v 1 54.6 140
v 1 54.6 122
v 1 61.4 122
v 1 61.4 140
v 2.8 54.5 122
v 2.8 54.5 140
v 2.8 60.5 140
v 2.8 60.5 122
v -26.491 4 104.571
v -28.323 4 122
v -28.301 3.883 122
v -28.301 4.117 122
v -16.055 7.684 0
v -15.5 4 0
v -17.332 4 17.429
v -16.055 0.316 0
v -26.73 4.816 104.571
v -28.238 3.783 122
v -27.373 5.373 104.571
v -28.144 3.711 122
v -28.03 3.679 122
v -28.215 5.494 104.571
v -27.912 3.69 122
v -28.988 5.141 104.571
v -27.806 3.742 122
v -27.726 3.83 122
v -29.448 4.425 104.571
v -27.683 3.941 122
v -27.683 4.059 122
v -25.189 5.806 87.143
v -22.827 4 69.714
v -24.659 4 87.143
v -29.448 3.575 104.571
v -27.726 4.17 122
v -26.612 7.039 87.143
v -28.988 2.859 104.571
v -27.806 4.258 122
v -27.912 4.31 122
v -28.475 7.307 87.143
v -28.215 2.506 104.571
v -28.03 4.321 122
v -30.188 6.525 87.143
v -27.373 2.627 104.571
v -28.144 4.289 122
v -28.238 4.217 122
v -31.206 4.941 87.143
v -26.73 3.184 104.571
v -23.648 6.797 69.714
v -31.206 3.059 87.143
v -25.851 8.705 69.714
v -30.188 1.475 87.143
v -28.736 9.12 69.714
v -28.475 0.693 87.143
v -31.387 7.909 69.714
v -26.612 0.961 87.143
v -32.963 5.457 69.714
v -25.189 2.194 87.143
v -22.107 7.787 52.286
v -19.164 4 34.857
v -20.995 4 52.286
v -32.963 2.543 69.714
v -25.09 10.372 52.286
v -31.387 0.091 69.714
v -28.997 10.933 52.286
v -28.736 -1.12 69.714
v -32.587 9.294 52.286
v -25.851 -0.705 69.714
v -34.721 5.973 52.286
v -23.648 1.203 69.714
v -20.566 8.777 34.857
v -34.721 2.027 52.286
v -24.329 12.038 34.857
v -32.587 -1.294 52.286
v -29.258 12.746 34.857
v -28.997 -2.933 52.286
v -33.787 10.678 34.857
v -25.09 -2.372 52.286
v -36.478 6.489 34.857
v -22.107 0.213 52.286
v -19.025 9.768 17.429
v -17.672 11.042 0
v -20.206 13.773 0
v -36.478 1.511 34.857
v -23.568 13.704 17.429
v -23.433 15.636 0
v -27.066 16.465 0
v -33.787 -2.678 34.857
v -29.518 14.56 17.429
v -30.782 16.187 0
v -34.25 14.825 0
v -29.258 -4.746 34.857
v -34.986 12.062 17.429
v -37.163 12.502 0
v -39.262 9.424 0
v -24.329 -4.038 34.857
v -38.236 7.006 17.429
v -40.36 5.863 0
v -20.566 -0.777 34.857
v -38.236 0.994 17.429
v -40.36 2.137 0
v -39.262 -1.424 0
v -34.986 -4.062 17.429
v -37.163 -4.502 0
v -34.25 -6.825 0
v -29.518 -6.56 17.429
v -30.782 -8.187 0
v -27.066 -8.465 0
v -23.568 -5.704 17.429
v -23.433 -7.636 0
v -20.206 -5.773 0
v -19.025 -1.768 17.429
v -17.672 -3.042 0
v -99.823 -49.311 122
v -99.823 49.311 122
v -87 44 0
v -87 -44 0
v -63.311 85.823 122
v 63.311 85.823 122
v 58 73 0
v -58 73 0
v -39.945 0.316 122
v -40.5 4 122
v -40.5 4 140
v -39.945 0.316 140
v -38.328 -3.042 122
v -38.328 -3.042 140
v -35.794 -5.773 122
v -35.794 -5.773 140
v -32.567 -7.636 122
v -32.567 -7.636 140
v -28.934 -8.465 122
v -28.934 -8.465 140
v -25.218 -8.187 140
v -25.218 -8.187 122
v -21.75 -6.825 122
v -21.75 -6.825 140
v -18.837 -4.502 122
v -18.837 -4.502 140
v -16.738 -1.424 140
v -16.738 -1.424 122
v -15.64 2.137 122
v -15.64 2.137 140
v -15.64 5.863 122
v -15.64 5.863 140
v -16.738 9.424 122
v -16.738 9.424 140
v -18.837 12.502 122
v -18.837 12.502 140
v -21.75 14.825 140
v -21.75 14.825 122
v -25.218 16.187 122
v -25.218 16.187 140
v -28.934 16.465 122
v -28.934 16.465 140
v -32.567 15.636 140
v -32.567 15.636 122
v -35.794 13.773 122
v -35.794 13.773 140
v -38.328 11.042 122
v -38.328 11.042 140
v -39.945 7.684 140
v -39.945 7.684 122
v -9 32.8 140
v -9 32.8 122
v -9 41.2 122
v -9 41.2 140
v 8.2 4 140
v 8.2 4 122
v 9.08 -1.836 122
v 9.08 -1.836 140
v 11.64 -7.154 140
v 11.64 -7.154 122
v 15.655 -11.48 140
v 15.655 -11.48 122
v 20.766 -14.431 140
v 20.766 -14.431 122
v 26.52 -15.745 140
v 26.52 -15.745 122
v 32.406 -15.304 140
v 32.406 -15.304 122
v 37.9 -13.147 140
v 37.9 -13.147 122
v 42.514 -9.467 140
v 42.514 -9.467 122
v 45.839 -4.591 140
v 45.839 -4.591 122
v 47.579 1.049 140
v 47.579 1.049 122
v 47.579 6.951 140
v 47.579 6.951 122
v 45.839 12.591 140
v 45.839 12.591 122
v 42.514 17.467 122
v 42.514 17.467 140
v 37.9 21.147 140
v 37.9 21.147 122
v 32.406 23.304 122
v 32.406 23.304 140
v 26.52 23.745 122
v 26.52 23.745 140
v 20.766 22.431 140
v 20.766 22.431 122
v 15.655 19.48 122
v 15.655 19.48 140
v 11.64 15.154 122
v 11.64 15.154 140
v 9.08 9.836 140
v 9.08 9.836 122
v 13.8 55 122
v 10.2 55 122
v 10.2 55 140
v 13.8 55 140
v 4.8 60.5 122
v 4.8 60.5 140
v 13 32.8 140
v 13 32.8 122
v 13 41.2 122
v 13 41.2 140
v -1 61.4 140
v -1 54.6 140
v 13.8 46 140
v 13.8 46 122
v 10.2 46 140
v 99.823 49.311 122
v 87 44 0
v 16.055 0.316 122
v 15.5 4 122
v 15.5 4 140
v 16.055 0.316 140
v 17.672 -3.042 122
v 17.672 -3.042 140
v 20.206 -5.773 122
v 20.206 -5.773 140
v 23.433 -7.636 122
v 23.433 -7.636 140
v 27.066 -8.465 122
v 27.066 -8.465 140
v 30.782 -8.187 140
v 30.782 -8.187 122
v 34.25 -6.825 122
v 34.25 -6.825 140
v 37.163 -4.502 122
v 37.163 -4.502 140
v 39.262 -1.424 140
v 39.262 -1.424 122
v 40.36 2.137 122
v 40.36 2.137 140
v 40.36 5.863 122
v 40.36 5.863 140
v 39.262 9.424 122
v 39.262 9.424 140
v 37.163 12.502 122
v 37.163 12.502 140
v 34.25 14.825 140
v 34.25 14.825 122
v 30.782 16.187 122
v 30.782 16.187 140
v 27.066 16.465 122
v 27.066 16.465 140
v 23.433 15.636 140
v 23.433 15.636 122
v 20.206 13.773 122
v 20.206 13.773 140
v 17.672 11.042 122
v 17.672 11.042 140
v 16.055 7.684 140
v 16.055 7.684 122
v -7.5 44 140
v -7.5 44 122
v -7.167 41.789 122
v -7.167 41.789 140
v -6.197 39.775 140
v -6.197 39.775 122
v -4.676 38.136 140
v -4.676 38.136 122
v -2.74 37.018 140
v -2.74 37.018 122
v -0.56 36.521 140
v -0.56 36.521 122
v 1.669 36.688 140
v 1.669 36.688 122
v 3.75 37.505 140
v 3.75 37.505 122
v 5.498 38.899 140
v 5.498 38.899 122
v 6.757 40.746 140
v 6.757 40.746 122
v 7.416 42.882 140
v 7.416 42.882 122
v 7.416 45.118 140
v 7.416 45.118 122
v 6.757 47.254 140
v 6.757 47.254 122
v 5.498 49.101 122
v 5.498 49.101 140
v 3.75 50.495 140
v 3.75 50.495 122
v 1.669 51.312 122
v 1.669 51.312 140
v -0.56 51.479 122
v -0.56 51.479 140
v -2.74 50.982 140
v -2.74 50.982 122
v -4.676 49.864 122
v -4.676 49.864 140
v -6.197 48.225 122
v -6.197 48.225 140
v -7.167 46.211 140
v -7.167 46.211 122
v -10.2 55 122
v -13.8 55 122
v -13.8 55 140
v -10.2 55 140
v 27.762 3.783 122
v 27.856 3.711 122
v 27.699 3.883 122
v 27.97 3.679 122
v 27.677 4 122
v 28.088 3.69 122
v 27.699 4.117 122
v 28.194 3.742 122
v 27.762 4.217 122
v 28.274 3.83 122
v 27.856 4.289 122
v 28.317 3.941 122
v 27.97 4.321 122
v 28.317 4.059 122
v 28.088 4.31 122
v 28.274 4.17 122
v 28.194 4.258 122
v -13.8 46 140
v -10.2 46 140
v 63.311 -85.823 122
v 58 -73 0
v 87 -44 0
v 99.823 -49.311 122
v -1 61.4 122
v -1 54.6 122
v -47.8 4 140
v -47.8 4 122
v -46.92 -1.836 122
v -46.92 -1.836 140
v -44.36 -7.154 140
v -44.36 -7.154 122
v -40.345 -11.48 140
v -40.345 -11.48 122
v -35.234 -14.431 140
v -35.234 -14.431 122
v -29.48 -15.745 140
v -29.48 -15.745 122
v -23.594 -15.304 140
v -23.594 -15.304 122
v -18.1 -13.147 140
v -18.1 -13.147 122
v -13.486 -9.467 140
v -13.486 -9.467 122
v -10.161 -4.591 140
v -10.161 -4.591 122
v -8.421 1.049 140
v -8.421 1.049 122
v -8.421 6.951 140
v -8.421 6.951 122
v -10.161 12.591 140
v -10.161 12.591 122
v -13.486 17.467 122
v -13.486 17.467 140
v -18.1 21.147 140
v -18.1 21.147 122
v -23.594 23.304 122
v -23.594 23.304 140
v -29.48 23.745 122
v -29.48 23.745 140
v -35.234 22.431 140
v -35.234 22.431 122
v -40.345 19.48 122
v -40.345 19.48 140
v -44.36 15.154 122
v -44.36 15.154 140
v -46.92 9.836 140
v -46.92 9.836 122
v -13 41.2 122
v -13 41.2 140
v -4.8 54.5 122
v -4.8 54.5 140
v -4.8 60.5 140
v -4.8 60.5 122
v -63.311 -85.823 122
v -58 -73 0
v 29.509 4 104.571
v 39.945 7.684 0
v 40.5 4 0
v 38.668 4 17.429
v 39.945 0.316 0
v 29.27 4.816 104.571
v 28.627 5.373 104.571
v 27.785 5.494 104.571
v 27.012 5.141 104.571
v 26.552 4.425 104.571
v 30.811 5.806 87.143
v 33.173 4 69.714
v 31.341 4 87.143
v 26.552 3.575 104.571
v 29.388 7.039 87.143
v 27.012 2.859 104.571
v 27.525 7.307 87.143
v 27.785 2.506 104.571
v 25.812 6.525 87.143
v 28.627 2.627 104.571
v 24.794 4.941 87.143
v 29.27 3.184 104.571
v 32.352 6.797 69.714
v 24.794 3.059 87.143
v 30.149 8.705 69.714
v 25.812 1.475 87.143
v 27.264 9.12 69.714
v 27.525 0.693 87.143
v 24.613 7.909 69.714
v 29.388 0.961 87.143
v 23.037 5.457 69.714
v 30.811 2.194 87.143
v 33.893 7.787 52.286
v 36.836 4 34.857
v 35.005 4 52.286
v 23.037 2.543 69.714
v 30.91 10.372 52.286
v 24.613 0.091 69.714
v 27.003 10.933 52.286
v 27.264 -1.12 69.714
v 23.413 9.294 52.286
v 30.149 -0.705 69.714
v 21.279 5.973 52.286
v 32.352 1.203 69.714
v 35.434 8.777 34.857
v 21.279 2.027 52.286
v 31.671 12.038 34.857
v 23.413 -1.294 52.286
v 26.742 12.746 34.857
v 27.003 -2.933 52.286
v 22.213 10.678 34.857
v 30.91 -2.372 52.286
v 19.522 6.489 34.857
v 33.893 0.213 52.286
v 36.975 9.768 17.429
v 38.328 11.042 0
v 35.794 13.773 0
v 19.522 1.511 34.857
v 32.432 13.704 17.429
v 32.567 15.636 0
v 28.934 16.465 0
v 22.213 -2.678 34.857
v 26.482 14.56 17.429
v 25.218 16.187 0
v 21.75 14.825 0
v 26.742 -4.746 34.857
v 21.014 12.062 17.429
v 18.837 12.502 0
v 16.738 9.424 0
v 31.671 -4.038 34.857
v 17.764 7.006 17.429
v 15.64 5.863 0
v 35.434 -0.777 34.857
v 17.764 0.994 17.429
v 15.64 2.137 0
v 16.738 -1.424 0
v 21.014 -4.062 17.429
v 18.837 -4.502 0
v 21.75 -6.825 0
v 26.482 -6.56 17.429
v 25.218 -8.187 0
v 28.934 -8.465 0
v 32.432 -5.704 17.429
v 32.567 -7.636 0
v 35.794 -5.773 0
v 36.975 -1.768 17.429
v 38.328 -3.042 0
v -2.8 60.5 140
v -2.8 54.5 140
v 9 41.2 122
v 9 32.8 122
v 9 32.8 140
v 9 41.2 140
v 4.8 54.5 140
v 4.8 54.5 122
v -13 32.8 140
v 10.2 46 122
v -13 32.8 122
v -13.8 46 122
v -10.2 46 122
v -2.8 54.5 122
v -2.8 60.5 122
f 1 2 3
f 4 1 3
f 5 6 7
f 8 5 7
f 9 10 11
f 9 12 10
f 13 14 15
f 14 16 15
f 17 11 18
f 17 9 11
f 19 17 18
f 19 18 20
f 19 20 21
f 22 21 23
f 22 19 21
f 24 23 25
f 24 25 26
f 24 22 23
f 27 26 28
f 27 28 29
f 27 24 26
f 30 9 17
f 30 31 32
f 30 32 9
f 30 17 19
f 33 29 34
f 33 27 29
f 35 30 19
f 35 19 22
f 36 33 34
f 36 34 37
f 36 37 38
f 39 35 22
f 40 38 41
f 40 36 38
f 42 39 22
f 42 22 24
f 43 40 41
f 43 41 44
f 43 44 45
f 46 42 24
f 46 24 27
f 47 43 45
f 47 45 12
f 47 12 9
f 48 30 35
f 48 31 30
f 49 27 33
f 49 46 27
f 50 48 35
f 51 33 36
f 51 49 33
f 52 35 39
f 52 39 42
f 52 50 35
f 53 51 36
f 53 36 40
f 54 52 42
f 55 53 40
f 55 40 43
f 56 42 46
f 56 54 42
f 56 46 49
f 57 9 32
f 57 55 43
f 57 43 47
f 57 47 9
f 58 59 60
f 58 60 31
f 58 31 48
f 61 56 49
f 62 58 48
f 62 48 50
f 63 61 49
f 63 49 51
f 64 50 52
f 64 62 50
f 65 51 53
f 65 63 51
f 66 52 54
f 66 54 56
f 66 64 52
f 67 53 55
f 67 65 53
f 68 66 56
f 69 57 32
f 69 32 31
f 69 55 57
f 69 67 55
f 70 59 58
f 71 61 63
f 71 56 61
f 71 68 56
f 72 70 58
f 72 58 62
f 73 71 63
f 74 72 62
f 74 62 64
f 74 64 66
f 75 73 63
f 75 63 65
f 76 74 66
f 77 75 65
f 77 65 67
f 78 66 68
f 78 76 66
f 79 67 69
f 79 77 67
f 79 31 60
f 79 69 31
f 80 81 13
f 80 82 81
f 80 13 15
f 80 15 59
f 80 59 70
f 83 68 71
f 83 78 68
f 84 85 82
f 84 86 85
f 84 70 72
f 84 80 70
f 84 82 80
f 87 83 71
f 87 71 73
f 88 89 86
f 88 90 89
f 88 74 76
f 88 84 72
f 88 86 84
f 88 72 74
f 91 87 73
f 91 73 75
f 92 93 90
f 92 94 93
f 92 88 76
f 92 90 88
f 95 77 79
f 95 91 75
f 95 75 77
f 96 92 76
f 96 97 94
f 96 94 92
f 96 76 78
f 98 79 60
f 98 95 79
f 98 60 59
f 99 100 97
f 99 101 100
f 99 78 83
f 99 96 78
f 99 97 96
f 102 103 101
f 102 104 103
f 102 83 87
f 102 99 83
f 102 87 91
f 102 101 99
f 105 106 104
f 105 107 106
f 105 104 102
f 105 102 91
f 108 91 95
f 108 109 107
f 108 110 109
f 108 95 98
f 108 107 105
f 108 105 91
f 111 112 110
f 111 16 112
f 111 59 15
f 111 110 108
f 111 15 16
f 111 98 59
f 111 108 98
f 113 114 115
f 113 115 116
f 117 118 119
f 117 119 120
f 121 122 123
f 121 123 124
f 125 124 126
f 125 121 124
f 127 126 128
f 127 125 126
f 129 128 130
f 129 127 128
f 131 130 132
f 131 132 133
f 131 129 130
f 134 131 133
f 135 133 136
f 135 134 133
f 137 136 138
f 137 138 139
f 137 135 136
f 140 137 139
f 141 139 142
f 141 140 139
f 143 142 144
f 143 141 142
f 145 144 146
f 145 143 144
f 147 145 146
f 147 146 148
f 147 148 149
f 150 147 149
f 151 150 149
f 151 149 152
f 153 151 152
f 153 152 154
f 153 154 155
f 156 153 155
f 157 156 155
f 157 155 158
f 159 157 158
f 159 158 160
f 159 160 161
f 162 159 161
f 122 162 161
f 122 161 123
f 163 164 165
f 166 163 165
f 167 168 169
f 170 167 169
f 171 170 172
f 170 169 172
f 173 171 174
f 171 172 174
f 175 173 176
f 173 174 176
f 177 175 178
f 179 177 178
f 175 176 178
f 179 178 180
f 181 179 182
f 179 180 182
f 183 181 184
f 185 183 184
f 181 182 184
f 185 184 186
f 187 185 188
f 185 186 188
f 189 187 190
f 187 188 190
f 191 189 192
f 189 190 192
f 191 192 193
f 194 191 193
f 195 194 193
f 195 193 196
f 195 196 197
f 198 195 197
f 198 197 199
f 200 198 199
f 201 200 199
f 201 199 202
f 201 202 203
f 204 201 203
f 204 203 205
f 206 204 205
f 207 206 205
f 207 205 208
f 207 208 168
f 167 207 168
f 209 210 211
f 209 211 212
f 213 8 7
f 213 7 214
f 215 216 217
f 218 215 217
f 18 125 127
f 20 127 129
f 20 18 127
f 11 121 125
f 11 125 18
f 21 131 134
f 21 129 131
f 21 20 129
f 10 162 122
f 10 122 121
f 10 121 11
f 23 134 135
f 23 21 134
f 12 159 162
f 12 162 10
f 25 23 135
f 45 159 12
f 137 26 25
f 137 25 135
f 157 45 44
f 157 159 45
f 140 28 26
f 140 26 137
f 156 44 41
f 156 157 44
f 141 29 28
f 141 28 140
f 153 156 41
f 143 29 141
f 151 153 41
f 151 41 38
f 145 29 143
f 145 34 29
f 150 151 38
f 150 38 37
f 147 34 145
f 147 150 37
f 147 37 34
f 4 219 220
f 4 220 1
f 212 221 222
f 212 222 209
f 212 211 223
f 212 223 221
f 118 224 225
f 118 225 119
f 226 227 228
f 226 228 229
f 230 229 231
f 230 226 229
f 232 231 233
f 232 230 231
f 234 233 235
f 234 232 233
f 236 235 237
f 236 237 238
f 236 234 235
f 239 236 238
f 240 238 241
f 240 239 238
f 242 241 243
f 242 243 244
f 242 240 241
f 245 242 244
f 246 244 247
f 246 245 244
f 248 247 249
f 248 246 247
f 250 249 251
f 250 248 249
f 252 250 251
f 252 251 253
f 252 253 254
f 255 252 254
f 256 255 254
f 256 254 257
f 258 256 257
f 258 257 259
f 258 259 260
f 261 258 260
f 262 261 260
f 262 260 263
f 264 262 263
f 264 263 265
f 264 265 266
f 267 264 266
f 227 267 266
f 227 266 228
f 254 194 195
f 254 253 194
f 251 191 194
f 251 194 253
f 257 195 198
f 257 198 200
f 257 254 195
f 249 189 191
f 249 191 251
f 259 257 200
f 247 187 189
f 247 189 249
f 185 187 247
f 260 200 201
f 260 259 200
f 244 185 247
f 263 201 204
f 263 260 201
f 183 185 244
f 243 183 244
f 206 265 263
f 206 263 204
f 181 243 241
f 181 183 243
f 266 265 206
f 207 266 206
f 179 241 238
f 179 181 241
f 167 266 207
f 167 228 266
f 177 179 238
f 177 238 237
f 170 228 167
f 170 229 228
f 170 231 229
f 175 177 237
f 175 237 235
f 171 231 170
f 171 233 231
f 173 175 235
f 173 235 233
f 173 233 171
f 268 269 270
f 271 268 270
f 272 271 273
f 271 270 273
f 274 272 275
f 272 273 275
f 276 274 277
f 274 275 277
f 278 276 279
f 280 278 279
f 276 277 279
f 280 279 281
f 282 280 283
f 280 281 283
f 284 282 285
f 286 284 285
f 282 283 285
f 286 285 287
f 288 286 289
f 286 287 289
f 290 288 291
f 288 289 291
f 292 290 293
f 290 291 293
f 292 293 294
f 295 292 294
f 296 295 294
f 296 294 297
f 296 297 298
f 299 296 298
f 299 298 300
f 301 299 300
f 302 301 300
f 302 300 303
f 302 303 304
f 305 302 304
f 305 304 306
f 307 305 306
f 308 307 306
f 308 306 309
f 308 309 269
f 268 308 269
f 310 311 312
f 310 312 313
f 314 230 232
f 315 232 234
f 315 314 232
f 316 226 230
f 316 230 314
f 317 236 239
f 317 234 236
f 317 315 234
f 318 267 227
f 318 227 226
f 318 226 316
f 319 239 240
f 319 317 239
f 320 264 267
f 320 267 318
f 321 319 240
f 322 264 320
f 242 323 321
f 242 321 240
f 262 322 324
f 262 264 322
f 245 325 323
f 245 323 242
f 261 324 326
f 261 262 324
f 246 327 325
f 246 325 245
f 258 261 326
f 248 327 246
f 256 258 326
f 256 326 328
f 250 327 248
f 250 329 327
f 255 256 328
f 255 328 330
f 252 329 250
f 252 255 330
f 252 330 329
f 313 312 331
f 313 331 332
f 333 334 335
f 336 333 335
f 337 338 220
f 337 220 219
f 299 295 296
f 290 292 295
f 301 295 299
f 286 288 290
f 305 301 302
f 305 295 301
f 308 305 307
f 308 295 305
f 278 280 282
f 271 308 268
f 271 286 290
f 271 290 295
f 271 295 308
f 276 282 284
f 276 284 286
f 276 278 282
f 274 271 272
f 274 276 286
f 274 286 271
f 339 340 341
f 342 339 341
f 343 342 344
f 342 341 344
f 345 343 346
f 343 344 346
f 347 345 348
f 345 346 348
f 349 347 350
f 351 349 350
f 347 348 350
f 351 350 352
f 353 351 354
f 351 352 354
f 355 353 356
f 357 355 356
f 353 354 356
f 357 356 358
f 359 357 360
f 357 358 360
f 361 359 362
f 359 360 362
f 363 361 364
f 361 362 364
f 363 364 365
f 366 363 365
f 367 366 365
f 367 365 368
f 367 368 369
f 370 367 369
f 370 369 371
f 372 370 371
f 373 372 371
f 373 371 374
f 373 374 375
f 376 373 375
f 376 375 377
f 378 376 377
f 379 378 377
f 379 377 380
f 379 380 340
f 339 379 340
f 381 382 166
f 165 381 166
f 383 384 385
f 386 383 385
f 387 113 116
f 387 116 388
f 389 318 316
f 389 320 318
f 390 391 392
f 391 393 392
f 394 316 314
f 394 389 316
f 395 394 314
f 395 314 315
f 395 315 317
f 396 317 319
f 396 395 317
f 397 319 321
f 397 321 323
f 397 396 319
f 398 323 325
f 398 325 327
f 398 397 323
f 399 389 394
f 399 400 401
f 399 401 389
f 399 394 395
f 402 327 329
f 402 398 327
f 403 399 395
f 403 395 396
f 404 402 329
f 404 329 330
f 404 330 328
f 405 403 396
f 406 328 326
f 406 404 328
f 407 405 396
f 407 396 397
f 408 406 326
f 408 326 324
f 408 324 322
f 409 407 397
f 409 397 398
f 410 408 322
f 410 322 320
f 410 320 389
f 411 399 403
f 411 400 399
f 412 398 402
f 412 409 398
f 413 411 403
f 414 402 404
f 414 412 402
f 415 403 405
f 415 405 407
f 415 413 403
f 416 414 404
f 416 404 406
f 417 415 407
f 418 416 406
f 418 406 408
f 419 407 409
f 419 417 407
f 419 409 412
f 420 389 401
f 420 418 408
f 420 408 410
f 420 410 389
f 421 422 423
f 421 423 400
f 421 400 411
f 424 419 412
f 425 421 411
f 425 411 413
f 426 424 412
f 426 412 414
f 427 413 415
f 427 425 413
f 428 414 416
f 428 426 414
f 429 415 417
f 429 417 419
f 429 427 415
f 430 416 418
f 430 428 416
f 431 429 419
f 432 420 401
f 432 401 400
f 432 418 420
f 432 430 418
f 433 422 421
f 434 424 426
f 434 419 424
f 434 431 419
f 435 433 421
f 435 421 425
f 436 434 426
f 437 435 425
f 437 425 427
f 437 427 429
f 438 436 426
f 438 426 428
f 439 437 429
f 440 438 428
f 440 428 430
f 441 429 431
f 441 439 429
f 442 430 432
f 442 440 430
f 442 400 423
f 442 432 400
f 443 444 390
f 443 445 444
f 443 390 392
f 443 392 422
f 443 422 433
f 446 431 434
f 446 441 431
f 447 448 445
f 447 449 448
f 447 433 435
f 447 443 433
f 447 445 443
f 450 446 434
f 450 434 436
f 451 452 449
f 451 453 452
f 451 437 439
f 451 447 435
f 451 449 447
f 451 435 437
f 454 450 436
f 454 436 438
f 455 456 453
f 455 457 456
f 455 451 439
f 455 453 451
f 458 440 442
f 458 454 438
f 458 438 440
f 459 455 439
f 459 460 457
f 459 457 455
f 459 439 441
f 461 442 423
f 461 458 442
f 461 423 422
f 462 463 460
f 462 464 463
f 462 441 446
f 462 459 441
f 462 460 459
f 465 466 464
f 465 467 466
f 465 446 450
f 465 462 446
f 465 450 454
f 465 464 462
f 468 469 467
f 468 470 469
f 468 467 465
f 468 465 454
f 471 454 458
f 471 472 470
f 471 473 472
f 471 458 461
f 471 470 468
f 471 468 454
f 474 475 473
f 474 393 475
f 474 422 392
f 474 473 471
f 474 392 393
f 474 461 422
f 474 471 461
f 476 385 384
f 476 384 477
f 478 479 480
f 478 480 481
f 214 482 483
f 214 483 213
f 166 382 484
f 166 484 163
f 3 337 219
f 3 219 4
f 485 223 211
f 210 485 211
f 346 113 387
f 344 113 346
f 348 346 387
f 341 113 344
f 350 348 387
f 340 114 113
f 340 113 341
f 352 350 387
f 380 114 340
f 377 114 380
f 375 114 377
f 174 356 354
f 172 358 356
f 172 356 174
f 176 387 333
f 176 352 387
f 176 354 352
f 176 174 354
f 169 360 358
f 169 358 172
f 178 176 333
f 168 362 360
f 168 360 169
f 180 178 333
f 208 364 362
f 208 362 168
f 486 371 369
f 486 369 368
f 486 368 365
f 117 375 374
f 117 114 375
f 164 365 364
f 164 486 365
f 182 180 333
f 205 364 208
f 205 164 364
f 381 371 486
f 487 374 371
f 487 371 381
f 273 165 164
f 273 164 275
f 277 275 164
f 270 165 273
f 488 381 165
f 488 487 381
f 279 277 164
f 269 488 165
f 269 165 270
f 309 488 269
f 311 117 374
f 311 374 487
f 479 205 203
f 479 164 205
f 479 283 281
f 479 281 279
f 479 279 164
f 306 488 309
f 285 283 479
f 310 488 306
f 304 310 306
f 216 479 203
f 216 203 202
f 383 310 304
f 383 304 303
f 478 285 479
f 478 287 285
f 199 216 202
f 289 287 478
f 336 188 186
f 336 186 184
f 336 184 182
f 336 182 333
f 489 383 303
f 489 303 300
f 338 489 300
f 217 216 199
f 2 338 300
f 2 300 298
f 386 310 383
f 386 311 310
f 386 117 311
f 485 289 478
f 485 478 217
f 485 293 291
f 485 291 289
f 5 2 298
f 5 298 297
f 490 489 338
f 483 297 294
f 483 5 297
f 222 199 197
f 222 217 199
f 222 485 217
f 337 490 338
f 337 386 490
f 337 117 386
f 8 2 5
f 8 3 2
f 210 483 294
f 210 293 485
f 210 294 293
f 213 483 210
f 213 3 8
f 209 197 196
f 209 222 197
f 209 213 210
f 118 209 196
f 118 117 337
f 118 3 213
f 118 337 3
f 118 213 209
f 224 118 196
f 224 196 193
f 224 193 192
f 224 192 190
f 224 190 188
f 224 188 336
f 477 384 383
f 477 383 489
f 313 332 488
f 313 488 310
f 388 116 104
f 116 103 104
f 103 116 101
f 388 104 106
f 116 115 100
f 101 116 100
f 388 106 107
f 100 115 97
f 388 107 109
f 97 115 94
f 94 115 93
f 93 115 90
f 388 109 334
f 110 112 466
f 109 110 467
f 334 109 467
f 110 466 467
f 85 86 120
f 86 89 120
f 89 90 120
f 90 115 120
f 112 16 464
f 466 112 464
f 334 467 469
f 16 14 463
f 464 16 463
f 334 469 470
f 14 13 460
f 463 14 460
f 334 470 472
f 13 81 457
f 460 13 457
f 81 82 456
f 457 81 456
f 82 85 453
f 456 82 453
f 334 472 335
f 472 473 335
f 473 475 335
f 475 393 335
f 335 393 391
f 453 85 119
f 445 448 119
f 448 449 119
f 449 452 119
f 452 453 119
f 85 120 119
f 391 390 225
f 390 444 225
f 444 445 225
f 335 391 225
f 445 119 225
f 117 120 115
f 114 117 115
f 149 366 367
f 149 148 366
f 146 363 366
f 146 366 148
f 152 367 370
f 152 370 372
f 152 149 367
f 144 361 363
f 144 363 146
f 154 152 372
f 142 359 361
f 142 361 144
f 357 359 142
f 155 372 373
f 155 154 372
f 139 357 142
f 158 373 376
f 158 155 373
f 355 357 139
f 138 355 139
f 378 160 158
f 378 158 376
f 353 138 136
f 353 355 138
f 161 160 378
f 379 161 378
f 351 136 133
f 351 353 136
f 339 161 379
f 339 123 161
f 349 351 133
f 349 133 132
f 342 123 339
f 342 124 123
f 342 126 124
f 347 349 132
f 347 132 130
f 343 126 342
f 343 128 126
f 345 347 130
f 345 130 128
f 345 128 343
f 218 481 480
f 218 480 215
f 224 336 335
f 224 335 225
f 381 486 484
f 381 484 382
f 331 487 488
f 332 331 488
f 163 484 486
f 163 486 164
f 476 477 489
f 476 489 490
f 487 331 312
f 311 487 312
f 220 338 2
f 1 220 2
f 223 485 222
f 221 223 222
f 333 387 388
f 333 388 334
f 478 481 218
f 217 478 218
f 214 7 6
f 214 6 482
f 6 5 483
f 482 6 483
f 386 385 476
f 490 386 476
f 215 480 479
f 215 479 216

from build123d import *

# Parameters (mm, degrees)
SKETCH1_R           = 12.5
BOSS_EXTRUDE1_DEPTH = 122
BOSS_EXTRUDE1_DRAFT = -6
SKETCH2_R           = 19.8
SKETCH2_R_2         = 12.5
SKETCH2_R_3         = 7.5
SKETCH2_W           = 2
SKETCH2_H           = 6
SKETCH2_H_2         = 6.8
SKETCH2_W_2         = 3.6
SKETCH2_H_3         = 9
SKETCH2_W_3         = 4
SKETCH2_H_4         = 8.4
BOSS_EXTRUDE2_DEPTH = 140


with BuildPart() as part:
    # Sketch1 → Boss-Extrude1 (with draft: the straight prism first)
    with BuildSketch(Plane.XY):
        Polygon((-58, 73), (-87, 44), (-87, -44), (-58, -73), (58, -73), (87, -44), (87, 44), (58, 73), align=None)
        with Locations((-28, 4)):
            Circle(SKETCH1_R, mode=Mode.SUBTRACT)
        with Locations((28, 4)):
            Circle(SKETCH1_R, mode=Mode.SUBTRACT)
    extrude(amount=BOSS_EXTRUDE1_DEPTH)
    # Boss-Extrude1: the draft: its side faces are tilted about the plane it starts from
    boss_extrude1_sides = [part.faces().sort_by_distance(p)[0] for p in [
        (-72.5, 58.5, 61),
        (-87, 0, 61),
        (-72.5, -58.5, 61),
        (0, -73, 61),
        (72.5, -58.5, 61),
        (87, 0, 61),
        (72.5, 58.5, 61),
        (0, 73, 61),
        (-40.5, 4, 61),
        (15.5, 4, 61),
    ]]
    draft(boss_extrude1_sides, Plane.XY, BOSS_EXTRUDE1_DRAFT)

    # Sketch2 → Boss-Extrude2 (add)
    # profile 1 of 10: a face of its own
    with BuildSketch(Plane.XY):
        with Locations(Location((-28, 4, 0), (0, 0, 180))):
            Circle(SKETCH2_R)
        with Locations(Location((-28, 4, 0), (0, 0, 180))):
            Circle(SKETCH2_R_2, mode=Mode.SUBTRACT)
    # profile 2 of 10: a face of its own
    with BuildSketch(Plane.XY):
        with Locations(Location((28, 4, 0), (0, 0, 180))):
            Circle(SKETCH2_R)
        with Locations(Location((28, 4, 0), (0, 0, 180))):
            Circle(SKETCH2_R_2, mode=Mode.SUBTRACT)
    # profile 3 of 10: a face of its own
    with BuildSketch(Plane.XY):
        with Locations(Location((0, 44, 0), (0, 0, 180))):
            Circle(SKETCH2_R_3)
    # profile 4 of 10: a face of its own
    with BuildSketch(Plane.XY):
        with Locations((-3.8, 57.5)):
            Rectangle(SKETCH2_W, SKETCH2_H)
    # profile 5 of 10: a face of its own
    with BuildSketch(Plane.XY):
        with Locations((0, 58)):
            Rectangle(SKETCH2_W, SKETCH2_H_2)
    # profile 6 of 10: a face of its own
    with BuildSketch(Plane.XY):
        with Locations((3.8, 57.5)):
            Rectangle(SKETCH2_W, SKETCH2_H)
    # profile 7 of 10: a face of its own
    with BuildSketch(Plane.XY):
        with Locations((-12, 50.5)):
            Rectangle(SKETCH2_W_2, SKETCH2_H_3)
    # profile 8 of 10: a face of its own
    with BuildSketch(Plane.XY):
        with Locations((12, 50.5)):
            Rectangle(SKETCH2_W_2, SKETCH2_H_3)
    # profile 9 of 10: a face of its own
    with BuildSketch(Plane.XY):
        with Locations((-11, 37)):
            Rectangle(SKETCH2_W_3, SKETCH2_H_4)
    # profile 10 of 10: a face of its own
    with BuildSketch(Plane.XY):
        with Locations((11, 37)):
            Rectangle(SKETCH2_W_3, SKETCH2_H_4)
    extrude(amount=BOSS_EXTRUDE2_DEPTH)


solid = part.part
